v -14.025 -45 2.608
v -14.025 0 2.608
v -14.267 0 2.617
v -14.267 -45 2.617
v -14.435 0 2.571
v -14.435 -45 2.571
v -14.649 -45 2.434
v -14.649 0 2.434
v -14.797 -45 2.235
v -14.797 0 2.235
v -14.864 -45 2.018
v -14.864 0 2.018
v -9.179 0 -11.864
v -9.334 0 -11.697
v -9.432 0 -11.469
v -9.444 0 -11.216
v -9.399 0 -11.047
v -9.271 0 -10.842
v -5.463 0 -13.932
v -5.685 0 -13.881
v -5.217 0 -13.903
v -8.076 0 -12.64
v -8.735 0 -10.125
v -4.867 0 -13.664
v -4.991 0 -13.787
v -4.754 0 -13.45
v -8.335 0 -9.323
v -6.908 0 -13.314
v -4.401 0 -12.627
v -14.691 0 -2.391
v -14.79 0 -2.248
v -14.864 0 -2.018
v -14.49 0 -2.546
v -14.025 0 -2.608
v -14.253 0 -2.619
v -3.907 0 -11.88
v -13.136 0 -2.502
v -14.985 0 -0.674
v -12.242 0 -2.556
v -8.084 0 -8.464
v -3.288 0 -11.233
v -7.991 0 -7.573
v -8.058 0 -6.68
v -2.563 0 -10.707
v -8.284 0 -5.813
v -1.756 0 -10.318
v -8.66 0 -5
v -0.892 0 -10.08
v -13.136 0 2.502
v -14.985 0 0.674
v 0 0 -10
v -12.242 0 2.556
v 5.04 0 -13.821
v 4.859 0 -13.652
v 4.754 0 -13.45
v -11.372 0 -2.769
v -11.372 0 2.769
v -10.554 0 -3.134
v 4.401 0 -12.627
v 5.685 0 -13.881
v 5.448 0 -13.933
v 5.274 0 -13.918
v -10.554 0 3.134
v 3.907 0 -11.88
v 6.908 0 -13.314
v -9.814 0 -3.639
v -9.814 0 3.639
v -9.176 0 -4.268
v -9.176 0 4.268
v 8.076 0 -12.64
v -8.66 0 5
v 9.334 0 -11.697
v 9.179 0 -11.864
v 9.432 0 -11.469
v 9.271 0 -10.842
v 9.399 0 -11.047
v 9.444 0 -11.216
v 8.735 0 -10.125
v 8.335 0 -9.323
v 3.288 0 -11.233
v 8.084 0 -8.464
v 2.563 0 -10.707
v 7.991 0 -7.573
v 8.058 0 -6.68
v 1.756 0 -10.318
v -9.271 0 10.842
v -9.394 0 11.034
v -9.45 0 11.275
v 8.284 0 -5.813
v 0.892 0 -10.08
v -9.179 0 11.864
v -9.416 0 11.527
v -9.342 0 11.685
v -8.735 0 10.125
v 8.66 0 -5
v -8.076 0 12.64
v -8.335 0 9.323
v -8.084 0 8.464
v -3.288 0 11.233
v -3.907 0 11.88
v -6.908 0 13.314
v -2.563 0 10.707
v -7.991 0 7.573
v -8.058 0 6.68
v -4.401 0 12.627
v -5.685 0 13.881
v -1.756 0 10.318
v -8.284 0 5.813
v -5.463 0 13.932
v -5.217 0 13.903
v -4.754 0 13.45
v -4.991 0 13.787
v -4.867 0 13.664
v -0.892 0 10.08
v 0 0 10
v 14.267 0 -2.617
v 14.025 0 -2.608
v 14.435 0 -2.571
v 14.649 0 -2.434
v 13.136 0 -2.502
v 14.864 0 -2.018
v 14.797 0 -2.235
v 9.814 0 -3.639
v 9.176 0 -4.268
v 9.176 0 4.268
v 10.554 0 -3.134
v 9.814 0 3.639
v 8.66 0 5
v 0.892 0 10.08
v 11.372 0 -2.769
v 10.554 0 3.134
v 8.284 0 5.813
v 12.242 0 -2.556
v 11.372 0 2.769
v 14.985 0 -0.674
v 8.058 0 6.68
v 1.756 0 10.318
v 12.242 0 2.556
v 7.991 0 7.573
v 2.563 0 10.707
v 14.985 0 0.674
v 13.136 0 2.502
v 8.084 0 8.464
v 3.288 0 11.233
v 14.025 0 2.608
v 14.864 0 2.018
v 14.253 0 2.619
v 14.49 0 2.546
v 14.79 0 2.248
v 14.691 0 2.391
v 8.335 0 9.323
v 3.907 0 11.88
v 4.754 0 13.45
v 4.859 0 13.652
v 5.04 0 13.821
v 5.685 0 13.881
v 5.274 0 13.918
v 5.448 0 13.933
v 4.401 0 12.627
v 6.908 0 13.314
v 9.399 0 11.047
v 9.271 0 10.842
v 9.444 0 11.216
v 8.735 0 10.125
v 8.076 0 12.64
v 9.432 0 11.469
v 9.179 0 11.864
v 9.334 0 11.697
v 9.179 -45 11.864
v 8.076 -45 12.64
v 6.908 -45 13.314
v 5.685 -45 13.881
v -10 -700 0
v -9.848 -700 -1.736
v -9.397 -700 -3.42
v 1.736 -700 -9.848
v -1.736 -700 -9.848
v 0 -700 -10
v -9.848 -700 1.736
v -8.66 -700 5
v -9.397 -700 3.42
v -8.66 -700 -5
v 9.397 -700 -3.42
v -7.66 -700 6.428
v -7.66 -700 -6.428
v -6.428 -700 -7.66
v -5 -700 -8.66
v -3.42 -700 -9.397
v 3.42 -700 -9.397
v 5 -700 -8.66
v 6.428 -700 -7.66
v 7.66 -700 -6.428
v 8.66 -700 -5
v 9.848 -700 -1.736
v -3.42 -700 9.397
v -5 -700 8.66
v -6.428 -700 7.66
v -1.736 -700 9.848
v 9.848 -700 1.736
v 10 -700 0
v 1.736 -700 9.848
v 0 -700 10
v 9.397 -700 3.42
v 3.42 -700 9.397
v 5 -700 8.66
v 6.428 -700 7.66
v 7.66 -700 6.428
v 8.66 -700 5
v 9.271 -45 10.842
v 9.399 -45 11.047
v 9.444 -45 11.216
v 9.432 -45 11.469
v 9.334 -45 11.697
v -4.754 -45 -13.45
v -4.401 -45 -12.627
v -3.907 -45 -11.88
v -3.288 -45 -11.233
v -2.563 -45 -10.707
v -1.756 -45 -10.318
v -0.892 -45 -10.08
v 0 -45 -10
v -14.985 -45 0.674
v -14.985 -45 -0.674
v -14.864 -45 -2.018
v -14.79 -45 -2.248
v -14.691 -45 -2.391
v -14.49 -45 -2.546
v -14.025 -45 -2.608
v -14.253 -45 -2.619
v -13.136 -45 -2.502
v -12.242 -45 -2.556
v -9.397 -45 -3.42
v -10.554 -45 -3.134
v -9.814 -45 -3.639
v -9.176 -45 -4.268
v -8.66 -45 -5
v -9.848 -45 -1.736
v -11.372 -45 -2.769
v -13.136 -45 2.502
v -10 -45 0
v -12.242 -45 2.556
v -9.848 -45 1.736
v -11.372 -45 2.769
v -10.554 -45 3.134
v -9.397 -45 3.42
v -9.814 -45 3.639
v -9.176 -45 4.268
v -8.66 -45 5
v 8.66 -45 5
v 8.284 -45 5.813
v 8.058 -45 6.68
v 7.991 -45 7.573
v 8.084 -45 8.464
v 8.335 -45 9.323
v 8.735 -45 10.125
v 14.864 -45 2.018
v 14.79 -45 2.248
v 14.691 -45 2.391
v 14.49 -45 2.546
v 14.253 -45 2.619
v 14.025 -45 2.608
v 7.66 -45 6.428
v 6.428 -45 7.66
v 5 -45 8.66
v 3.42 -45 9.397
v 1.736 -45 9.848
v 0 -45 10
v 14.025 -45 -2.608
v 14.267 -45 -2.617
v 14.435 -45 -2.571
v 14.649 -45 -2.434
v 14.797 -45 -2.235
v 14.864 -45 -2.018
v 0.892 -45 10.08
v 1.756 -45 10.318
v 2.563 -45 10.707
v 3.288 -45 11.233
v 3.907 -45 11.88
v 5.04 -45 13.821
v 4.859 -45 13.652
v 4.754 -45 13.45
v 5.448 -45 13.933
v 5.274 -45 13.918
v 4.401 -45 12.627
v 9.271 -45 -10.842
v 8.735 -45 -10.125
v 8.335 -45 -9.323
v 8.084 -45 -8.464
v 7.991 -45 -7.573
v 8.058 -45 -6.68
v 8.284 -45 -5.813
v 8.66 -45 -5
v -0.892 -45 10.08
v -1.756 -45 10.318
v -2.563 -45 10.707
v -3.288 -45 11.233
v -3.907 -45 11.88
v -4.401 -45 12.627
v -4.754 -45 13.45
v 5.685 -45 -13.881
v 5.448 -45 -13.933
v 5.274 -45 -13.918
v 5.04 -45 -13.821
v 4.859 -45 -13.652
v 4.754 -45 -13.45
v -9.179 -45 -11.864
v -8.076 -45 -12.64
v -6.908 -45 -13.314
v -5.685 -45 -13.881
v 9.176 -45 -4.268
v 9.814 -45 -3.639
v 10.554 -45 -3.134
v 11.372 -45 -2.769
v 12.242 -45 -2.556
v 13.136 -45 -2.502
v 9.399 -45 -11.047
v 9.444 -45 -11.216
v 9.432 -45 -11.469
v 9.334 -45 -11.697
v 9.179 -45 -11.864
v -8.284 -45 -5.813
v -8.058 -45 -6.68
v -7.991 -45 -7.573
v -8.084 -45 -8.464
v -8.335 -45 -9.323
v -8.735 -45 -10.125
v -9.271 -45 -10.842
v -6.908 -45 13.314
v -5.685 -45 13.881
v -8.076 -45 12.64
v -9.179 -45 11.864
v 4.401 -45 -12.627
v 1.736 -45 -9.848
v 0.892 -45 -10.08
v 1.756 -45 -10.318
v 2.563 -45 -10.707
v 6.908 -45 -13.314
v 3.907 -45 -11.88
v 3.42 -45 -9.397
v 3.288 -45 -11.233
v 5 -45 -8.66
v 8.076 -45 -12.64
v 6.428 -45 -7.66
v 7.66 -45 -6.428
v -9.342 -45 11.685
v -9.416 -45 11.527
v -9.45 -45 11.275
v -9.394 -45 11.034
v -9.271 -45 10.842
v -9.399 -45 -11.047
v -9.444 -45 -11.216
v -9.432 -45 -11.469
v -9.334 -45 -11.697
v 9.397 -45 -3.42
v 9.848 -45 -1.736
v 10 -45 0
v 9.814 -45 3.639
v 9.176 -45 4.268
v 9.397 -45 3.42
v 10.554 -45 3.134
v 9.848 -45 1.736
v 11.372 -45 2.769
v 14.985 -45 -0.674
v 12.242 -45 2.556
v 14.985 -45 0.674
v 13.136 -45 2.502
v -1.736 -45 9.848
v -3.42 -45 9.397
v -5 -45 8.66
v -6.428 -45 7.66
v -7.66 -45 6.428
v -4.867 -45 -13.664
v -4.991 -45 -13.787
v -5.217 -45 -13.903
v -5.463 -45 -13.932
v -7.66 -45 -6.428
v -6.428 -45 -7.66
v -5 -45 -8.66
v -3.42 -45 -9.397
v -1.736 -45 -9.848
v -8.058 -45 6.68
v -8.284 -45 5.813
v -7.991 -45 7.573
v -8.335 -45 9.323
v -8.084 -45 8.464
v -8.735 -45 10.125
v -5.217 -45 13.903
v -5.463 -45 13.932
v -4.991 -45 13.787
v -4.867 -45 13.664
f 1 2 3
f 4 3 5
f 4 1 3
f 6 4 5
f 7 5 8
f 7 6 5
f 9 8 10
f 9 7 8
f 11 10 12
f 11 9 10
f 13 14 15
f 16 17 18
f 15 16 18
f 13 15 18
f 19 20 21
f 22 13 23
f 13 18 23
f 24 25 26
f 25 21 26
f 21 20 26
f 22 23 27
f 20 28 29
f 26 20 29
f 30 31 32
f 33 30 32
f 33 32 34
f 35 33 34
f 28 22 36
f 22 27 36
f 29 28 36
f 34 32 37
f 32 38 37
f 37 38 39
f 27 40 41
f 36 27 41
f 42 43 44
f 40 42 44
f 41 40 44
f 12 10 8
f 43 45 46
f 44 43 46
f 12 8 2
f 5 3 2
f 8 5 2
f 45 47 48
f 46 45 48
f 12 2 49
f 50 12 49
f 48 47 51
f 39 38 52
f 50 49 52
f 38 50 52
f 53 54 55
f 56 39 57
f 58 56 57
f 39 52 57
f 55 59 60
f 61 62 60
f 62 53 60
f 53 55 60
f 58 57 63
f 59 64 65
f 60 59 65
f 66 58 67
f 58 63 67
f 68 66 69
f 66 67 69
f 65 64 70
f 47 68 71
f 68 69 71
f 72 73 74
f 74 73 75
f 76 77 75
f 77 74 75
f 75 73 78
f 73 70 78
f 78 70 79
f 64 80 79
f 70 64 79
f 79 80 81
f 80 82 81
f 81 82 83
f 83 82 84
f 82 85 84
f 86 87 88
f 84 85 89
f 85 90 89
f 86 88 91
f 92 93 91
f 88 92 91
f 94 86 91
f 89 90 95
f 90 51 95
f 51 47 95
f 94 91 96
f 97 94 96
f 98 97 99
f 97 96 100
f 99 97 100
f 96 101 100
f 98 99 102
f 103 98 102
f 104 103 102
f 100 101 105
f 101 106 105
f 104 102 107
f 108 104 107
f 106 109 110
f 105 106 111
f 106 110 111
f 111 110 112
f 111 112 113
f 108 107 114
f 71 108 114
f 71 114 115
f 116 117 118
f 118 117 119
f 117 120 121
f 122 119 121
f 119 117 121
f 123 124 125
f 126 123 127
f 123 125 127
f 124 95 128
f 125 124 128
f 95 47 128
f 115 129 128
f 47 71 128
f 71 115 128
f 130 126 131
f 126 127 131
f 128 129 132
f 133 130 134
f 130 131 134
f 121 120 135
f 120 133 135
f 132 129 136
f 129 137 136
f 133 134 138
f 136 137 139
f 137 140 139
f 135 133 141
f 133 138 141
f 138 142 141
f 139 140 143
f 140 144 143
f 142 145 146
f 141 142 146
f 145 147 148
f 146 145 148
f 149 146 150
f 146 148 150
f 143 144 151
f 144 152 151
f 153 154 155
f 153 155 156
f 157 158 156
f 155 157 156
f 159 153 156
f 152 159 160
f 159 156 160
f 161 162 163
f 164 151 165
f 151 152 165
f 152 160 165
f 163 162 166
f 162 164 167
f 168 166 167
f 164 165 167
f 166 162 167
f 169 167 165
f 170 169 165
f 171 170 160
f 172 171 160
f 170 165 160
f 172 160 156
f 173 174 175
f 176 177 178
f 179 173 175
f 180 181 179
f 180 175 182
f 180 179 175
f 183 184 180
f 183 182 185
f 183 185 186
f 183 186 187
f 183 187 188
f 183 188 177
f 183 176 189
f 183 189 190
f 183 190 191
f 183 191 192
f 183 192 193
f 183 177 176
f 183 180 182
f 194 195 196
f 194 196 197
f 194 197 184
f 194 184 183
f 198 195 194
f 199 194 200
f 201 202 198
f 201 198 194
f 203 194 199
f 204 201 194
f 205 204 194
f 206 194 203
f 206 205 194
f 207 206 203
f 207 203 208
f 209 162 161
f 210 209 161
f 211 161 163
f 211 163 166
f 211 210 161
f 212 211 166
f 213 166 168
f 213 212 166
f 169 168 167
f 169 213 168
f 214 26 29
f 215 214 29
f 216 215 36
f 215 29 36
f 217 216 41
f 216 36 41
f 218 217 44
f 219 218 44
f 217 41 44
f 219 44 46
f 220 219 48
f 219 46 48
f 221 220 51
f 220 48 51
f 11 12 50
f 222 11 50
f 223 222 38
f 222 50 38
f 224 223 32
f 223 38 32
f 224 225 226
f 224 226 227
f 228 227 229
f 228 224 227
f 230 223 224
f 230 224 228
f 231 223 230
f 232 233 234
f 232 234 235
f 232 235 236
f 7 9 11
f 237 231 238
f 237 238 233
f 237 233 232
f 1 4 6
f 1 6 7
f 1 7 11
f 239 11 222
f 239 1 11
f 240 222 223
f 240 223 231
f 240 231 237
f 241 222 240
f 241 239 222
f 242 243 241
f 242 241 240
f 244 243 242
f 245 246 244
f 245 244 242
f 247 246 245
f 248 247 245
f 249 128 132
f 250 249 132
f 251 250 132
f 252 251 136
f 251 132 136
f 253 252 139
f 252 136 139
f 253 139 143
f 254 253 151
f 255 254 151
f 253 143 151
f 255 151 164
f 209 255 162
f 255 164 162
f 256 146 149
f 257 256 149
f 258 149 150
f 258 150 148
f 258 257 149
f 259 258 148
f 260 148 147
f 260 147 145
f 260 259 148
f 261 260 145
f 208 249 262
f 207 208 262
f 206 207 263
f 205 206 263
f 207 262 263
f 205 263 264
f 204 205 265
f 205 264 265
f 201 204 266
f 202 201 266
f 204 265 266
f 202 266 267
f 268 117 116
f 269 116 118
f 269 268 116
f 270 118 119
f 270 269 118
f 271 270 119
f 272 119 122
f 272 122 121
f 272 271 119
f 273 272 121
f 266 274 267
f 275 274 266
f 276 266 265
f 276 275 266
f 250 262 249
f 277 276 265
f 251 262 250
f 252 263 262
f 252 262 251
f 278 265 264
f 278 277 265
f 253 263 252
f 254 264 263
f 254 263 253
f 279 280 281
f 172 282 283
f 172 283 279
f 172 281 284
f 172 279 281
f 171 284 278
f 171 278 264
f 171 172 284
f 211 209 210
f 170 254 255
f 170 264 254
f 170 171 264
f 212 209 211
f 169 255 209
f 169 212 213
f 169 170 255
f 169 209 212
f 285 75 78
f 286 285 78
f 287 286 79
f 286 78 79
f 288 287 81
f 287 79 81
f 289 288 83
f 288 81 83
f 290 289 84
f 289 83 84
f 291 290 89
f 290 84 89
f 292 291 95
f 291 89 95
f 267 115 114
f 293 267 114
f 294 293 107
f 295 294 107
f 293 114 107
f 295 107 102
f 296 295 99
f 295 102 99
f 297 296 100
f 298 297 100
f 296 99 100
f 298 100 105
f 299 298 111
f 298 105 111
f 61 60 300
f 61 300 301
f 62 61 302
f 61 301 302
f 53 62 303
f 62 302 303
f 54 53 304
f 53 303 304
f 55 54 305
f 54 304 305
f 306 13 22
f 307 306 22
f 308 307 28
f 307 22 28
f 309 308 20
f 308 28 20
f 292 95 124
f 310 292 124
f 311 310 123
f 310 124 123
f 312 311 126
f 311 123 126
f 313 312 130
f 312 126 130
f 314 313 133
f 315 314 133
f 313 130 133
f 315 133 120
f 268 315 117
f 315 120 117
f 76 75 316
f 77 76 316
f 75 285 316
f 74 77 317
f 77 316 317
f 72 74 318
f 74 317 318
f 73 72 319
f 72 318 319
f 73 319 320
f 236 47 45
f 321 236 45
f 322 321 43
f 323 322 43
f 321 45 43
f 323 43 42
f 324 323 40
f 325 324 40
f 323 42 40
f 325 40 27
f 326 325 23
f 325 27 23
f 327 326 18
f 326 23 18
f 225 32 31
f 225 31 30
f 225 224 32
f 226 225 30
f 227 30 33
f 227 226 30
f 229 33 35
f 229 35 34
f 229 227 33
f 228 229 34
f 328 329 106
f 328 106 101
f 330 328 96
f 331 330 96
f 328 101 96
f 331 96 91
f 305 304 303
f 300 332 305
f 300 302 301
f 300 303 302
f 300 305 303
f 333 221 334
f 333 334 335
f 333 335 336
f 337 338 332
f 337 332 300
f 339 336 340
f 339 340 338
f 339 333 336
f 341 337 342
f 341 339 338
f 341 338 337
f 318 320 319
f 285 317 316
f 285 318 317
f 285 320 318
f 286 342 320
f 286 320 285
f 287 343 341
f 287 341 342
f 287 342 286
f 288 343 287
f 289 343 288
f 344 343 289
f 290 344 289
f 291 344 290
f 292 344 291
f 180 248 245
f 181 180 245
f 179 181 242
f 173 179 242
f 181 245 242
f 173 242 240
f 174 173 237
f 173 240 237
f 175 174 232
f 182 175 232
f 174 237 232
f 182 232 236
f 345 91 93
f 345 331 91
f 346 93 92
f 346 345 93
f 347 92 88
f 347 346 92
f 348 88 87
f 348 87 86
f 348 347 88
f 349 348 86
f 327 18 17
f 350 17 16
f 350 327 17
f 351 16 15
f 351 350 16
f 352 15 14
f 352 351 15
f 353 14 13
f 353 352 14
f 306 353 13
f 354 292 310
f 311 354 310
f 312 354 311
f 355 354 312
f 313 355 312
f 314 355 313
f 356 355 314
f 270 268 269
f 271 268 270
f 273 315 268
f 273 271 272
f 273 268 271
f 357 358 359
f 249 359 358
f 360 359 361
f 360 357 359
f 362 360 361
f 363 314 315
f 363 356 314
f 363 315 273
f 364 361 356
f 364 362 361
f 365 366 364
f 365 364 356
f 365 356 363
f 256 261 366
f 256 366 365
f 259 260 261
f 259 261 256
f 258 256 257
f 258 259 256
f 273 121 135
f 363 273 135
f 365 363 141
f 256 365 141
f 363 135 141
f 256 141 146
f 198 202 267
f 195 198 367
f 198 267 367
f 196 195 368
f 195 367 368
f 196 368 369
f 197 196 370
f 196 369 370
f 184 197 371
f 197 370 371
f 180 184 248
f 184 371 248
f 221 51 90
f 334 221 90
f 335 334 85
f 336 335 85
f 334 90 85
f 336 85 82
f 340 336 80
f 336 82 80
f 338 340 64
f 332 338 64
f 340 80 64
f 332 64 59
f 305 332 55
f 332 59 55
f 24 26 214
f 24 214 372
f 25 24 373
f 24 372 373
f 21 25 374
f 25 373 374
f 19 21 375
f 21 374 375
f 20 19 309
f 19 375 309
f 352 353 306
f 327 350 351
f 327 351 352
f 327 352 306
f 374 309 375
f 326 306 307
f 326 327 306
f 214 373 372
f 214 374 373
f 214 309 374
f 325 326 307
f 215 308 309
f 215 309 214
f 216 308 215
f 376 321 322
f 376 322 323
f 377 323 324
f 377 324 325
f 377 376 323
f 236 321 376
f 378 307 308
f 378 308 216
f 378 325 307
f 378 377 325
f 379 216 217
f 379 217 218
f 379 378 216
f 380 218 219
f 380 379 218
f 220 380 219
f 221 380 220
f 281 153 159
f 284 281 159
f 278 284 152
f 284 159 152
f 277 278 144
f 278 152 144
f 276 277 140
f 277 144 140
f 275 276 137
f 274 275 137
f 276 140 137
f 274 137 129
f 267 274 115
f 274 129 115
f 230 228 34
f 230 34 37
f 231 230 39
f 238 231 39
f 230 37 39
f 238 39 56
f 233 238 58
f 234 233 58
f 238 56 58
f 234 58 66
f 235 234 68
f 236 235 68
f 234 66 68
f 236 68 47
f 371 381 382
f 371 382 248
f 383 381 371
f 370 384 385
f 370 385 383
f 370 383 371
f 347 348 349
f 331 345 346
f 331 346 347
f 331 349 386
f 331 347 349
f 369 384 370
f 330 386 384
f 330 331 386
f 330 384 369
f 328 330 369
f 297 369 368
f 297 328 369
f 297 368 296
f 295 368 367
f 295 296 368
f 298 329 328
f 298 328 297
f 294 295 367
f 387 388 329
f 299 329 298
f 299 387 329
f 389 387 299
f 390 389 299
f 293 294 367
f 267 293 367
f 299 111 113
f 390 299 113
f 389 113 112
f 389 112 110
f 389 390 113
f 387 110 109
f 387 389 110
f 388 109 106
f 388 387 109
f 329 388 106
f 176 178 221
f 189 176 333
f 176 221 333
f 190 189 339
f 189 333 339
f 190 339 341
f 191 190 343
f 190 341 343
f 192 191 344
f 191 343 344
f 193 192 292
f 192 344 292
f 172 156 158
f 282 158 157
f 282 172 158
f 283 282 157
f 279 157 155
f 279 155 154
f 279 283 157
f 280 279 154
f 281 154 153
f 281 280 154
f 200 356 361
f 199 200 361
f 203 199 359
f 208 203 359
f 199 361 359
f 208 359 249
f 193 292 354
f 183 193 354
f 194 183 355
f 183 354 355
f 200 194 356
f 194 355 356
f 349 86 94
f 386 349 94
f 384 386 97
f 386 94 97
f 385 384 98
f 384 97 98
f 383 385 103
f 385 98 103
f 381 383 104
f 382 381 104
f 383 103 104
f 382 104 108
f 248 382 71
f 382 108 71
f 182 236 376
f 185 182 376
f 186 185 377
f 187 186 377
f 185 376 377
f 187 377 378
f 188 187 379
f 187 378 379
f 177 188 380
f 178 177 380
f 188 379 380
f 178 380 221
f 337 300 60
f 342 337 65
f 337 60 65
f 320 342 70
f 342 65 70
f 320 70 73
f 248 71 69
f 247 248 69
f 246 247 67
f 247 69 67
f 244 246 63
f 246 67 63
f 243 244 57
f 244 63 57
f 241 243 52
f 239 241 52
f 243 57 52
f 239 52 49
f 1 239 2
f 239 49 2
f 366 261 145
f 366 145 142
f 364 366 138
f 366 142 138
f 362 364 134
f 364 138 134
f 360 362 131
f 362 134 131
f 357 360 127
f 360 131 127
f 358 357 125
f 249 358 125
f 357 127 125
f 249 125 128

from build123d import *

# Parameters (mm, degrees)
F1_DEPTH = 700
F2_DEPTH = 45
F3_R     = 0.7


with BuildPart() as f1:
    # F0 (on Front) → F1 (new body)
    with BuildSketch(Plane.XZ):
        with BuildLine():
            ThreePointArc((8.660254, -5), (9.659258, -2.58819), (10, 0))
            ThreePointArc((10, 0), (9.659258, 2.588191), (8.660254, 5))
            ThreePointArc((8.660254, 5), (5, 8.660254), (0, 10))
            ThreePointArc((0, 10), (-5, 8.660254), (-8.660254, 5))
            ThreePointArc((-8.660254, 5), (-10, 0), (-8.660254, -5))
            ThreePointArc((-8.660254, -5), (-5, -8.660254), (0, -10))
            ThreePointArc((0, -10), (5, -8.660254), (8.660254, -5))
        make_face()
    extrude(amount=F1_DEPTH)

    # F0 (on Front) → F2 (join)
    with BuildSketch(Plane.XZ):
        with BuildLine():
            ThreePointArc((8.660254, 5), (9.659258, 2.588191), (10, 0))
            ThreePointArc((10, 0), (9.659258, -2.58819), (8.660254, -5))
            ThreePointArc((8.660254, -5), (11.296935, -2.795508), (14.733726, -2.813771))
            ThreePointArc((14.733726, -2.813771), (15, 0), (14.733726, 2.813771))
            ThreePointArc((14.733726, 2.813771), (11.296935, 2.795509), (8.660254, 5))
        make_face()
        with BuildLine():
            ThreePointArc((0, 10), (5, 8.660254), (8.660254, 5))
            ThreePointArc((8.660254, 5), (8.069449, 8.385679), (9.80366, 11.352896))
            ThreePointArc((9.80366, 11.352896), (7.5, 12.990381), (4.930066, 14.166667))
            ThreePointArc((4.930066, 14.166667), (3.227486, 11.181187), (0, 10))
        make_face()
        with BuildLine():
            ThreePointArc((9.80366, -11.352896), (8.069449, -8.385678), (8.660254, -5))
            ThreePointArc((8.660254, -5), (5, -8.660254), (0, -10))
            ThreePointArc((0, -10), (3.227486, -11.181187), (4.930066, -14.166667))
            ThreePointArc((4.930066, -14.166667), (7.5, -12.990381), (9.80366, -11.352896))
        make_face()
        with BuildLine():
            ThreePointArc((-8.660254, 5), (-5, 8.660254), (0, 10))
            ThreePointArc((0, 10), (-3.227486, 11.181187), (-4.930066, 14.166667))
            ThreePointArc((-4.930066, 14.166667), (-7.5, 12.990381), (-9.80366, 11.352896))
            ThreePointArc((-9.80366, 11.352896), (-8.069449, 8.385678), (-8.660254, 5))
        make_face()
        with BuildLine():
            ThreePointArc((-4.930066, -14.166667), (-3.227486, -11.181187), (0, -10))
            ThreePointArc((0, -10), (-5, -8.660254), (-8.660254, -5))
            ThreePointArc((-8.660254, -5), (-8.069449, -8.385678), (-9.80366, -11.352896))
            ThreePointArc((-9.80366, -11.352896), (-7.5, -12.990381), (-4.930066, -14.166667))
        make_face()
        with BuildLine():
            ThreePointArc((-8.660254, -5), (-10, 0), (-8.660254, 5))
            ThreePointArc((-8.660254, 5), (-11.296935, 2.795508), (-14.733726, 2.813771))
            ThreePointArc((-14.733726, 2.813771), (-15, 0), (-14.733726, -2.813771))
            ThreePointArc((-14.733726, -2.813771), (-11.296935, -2.795508), (-8.660254, -5))
        make_face()
    extrude(amount=F2_DEPTH)

    # F3
    f3_edges = [f1.edges().sort_by_distance(p)[0] for p in [
        (14.733726, -22.5, -2.813771),
        (9.80366, -22.5, -11.352896),
        (4.930066, -22.5, -14.166667),
        (-4.930066, -22.5, -14.166667),
        (-9.80366, -22.5, -11.352896),
        (-14.733726, -22.5, -2.813771),
        (-14.733726, -22.5, 2.813771),
        (-9.80366, -22.5, 11.352896),
        (-4.930066, -22.5, 14.166667),
        (4.930066, -22.5, 14.166667),
        (9.80366, -22.5, 11.352896),
        (14.733726, -22.5, 2.813771),
    ]]
    fillet(f3_edges, radius=F3_R)


solid = f1.part
